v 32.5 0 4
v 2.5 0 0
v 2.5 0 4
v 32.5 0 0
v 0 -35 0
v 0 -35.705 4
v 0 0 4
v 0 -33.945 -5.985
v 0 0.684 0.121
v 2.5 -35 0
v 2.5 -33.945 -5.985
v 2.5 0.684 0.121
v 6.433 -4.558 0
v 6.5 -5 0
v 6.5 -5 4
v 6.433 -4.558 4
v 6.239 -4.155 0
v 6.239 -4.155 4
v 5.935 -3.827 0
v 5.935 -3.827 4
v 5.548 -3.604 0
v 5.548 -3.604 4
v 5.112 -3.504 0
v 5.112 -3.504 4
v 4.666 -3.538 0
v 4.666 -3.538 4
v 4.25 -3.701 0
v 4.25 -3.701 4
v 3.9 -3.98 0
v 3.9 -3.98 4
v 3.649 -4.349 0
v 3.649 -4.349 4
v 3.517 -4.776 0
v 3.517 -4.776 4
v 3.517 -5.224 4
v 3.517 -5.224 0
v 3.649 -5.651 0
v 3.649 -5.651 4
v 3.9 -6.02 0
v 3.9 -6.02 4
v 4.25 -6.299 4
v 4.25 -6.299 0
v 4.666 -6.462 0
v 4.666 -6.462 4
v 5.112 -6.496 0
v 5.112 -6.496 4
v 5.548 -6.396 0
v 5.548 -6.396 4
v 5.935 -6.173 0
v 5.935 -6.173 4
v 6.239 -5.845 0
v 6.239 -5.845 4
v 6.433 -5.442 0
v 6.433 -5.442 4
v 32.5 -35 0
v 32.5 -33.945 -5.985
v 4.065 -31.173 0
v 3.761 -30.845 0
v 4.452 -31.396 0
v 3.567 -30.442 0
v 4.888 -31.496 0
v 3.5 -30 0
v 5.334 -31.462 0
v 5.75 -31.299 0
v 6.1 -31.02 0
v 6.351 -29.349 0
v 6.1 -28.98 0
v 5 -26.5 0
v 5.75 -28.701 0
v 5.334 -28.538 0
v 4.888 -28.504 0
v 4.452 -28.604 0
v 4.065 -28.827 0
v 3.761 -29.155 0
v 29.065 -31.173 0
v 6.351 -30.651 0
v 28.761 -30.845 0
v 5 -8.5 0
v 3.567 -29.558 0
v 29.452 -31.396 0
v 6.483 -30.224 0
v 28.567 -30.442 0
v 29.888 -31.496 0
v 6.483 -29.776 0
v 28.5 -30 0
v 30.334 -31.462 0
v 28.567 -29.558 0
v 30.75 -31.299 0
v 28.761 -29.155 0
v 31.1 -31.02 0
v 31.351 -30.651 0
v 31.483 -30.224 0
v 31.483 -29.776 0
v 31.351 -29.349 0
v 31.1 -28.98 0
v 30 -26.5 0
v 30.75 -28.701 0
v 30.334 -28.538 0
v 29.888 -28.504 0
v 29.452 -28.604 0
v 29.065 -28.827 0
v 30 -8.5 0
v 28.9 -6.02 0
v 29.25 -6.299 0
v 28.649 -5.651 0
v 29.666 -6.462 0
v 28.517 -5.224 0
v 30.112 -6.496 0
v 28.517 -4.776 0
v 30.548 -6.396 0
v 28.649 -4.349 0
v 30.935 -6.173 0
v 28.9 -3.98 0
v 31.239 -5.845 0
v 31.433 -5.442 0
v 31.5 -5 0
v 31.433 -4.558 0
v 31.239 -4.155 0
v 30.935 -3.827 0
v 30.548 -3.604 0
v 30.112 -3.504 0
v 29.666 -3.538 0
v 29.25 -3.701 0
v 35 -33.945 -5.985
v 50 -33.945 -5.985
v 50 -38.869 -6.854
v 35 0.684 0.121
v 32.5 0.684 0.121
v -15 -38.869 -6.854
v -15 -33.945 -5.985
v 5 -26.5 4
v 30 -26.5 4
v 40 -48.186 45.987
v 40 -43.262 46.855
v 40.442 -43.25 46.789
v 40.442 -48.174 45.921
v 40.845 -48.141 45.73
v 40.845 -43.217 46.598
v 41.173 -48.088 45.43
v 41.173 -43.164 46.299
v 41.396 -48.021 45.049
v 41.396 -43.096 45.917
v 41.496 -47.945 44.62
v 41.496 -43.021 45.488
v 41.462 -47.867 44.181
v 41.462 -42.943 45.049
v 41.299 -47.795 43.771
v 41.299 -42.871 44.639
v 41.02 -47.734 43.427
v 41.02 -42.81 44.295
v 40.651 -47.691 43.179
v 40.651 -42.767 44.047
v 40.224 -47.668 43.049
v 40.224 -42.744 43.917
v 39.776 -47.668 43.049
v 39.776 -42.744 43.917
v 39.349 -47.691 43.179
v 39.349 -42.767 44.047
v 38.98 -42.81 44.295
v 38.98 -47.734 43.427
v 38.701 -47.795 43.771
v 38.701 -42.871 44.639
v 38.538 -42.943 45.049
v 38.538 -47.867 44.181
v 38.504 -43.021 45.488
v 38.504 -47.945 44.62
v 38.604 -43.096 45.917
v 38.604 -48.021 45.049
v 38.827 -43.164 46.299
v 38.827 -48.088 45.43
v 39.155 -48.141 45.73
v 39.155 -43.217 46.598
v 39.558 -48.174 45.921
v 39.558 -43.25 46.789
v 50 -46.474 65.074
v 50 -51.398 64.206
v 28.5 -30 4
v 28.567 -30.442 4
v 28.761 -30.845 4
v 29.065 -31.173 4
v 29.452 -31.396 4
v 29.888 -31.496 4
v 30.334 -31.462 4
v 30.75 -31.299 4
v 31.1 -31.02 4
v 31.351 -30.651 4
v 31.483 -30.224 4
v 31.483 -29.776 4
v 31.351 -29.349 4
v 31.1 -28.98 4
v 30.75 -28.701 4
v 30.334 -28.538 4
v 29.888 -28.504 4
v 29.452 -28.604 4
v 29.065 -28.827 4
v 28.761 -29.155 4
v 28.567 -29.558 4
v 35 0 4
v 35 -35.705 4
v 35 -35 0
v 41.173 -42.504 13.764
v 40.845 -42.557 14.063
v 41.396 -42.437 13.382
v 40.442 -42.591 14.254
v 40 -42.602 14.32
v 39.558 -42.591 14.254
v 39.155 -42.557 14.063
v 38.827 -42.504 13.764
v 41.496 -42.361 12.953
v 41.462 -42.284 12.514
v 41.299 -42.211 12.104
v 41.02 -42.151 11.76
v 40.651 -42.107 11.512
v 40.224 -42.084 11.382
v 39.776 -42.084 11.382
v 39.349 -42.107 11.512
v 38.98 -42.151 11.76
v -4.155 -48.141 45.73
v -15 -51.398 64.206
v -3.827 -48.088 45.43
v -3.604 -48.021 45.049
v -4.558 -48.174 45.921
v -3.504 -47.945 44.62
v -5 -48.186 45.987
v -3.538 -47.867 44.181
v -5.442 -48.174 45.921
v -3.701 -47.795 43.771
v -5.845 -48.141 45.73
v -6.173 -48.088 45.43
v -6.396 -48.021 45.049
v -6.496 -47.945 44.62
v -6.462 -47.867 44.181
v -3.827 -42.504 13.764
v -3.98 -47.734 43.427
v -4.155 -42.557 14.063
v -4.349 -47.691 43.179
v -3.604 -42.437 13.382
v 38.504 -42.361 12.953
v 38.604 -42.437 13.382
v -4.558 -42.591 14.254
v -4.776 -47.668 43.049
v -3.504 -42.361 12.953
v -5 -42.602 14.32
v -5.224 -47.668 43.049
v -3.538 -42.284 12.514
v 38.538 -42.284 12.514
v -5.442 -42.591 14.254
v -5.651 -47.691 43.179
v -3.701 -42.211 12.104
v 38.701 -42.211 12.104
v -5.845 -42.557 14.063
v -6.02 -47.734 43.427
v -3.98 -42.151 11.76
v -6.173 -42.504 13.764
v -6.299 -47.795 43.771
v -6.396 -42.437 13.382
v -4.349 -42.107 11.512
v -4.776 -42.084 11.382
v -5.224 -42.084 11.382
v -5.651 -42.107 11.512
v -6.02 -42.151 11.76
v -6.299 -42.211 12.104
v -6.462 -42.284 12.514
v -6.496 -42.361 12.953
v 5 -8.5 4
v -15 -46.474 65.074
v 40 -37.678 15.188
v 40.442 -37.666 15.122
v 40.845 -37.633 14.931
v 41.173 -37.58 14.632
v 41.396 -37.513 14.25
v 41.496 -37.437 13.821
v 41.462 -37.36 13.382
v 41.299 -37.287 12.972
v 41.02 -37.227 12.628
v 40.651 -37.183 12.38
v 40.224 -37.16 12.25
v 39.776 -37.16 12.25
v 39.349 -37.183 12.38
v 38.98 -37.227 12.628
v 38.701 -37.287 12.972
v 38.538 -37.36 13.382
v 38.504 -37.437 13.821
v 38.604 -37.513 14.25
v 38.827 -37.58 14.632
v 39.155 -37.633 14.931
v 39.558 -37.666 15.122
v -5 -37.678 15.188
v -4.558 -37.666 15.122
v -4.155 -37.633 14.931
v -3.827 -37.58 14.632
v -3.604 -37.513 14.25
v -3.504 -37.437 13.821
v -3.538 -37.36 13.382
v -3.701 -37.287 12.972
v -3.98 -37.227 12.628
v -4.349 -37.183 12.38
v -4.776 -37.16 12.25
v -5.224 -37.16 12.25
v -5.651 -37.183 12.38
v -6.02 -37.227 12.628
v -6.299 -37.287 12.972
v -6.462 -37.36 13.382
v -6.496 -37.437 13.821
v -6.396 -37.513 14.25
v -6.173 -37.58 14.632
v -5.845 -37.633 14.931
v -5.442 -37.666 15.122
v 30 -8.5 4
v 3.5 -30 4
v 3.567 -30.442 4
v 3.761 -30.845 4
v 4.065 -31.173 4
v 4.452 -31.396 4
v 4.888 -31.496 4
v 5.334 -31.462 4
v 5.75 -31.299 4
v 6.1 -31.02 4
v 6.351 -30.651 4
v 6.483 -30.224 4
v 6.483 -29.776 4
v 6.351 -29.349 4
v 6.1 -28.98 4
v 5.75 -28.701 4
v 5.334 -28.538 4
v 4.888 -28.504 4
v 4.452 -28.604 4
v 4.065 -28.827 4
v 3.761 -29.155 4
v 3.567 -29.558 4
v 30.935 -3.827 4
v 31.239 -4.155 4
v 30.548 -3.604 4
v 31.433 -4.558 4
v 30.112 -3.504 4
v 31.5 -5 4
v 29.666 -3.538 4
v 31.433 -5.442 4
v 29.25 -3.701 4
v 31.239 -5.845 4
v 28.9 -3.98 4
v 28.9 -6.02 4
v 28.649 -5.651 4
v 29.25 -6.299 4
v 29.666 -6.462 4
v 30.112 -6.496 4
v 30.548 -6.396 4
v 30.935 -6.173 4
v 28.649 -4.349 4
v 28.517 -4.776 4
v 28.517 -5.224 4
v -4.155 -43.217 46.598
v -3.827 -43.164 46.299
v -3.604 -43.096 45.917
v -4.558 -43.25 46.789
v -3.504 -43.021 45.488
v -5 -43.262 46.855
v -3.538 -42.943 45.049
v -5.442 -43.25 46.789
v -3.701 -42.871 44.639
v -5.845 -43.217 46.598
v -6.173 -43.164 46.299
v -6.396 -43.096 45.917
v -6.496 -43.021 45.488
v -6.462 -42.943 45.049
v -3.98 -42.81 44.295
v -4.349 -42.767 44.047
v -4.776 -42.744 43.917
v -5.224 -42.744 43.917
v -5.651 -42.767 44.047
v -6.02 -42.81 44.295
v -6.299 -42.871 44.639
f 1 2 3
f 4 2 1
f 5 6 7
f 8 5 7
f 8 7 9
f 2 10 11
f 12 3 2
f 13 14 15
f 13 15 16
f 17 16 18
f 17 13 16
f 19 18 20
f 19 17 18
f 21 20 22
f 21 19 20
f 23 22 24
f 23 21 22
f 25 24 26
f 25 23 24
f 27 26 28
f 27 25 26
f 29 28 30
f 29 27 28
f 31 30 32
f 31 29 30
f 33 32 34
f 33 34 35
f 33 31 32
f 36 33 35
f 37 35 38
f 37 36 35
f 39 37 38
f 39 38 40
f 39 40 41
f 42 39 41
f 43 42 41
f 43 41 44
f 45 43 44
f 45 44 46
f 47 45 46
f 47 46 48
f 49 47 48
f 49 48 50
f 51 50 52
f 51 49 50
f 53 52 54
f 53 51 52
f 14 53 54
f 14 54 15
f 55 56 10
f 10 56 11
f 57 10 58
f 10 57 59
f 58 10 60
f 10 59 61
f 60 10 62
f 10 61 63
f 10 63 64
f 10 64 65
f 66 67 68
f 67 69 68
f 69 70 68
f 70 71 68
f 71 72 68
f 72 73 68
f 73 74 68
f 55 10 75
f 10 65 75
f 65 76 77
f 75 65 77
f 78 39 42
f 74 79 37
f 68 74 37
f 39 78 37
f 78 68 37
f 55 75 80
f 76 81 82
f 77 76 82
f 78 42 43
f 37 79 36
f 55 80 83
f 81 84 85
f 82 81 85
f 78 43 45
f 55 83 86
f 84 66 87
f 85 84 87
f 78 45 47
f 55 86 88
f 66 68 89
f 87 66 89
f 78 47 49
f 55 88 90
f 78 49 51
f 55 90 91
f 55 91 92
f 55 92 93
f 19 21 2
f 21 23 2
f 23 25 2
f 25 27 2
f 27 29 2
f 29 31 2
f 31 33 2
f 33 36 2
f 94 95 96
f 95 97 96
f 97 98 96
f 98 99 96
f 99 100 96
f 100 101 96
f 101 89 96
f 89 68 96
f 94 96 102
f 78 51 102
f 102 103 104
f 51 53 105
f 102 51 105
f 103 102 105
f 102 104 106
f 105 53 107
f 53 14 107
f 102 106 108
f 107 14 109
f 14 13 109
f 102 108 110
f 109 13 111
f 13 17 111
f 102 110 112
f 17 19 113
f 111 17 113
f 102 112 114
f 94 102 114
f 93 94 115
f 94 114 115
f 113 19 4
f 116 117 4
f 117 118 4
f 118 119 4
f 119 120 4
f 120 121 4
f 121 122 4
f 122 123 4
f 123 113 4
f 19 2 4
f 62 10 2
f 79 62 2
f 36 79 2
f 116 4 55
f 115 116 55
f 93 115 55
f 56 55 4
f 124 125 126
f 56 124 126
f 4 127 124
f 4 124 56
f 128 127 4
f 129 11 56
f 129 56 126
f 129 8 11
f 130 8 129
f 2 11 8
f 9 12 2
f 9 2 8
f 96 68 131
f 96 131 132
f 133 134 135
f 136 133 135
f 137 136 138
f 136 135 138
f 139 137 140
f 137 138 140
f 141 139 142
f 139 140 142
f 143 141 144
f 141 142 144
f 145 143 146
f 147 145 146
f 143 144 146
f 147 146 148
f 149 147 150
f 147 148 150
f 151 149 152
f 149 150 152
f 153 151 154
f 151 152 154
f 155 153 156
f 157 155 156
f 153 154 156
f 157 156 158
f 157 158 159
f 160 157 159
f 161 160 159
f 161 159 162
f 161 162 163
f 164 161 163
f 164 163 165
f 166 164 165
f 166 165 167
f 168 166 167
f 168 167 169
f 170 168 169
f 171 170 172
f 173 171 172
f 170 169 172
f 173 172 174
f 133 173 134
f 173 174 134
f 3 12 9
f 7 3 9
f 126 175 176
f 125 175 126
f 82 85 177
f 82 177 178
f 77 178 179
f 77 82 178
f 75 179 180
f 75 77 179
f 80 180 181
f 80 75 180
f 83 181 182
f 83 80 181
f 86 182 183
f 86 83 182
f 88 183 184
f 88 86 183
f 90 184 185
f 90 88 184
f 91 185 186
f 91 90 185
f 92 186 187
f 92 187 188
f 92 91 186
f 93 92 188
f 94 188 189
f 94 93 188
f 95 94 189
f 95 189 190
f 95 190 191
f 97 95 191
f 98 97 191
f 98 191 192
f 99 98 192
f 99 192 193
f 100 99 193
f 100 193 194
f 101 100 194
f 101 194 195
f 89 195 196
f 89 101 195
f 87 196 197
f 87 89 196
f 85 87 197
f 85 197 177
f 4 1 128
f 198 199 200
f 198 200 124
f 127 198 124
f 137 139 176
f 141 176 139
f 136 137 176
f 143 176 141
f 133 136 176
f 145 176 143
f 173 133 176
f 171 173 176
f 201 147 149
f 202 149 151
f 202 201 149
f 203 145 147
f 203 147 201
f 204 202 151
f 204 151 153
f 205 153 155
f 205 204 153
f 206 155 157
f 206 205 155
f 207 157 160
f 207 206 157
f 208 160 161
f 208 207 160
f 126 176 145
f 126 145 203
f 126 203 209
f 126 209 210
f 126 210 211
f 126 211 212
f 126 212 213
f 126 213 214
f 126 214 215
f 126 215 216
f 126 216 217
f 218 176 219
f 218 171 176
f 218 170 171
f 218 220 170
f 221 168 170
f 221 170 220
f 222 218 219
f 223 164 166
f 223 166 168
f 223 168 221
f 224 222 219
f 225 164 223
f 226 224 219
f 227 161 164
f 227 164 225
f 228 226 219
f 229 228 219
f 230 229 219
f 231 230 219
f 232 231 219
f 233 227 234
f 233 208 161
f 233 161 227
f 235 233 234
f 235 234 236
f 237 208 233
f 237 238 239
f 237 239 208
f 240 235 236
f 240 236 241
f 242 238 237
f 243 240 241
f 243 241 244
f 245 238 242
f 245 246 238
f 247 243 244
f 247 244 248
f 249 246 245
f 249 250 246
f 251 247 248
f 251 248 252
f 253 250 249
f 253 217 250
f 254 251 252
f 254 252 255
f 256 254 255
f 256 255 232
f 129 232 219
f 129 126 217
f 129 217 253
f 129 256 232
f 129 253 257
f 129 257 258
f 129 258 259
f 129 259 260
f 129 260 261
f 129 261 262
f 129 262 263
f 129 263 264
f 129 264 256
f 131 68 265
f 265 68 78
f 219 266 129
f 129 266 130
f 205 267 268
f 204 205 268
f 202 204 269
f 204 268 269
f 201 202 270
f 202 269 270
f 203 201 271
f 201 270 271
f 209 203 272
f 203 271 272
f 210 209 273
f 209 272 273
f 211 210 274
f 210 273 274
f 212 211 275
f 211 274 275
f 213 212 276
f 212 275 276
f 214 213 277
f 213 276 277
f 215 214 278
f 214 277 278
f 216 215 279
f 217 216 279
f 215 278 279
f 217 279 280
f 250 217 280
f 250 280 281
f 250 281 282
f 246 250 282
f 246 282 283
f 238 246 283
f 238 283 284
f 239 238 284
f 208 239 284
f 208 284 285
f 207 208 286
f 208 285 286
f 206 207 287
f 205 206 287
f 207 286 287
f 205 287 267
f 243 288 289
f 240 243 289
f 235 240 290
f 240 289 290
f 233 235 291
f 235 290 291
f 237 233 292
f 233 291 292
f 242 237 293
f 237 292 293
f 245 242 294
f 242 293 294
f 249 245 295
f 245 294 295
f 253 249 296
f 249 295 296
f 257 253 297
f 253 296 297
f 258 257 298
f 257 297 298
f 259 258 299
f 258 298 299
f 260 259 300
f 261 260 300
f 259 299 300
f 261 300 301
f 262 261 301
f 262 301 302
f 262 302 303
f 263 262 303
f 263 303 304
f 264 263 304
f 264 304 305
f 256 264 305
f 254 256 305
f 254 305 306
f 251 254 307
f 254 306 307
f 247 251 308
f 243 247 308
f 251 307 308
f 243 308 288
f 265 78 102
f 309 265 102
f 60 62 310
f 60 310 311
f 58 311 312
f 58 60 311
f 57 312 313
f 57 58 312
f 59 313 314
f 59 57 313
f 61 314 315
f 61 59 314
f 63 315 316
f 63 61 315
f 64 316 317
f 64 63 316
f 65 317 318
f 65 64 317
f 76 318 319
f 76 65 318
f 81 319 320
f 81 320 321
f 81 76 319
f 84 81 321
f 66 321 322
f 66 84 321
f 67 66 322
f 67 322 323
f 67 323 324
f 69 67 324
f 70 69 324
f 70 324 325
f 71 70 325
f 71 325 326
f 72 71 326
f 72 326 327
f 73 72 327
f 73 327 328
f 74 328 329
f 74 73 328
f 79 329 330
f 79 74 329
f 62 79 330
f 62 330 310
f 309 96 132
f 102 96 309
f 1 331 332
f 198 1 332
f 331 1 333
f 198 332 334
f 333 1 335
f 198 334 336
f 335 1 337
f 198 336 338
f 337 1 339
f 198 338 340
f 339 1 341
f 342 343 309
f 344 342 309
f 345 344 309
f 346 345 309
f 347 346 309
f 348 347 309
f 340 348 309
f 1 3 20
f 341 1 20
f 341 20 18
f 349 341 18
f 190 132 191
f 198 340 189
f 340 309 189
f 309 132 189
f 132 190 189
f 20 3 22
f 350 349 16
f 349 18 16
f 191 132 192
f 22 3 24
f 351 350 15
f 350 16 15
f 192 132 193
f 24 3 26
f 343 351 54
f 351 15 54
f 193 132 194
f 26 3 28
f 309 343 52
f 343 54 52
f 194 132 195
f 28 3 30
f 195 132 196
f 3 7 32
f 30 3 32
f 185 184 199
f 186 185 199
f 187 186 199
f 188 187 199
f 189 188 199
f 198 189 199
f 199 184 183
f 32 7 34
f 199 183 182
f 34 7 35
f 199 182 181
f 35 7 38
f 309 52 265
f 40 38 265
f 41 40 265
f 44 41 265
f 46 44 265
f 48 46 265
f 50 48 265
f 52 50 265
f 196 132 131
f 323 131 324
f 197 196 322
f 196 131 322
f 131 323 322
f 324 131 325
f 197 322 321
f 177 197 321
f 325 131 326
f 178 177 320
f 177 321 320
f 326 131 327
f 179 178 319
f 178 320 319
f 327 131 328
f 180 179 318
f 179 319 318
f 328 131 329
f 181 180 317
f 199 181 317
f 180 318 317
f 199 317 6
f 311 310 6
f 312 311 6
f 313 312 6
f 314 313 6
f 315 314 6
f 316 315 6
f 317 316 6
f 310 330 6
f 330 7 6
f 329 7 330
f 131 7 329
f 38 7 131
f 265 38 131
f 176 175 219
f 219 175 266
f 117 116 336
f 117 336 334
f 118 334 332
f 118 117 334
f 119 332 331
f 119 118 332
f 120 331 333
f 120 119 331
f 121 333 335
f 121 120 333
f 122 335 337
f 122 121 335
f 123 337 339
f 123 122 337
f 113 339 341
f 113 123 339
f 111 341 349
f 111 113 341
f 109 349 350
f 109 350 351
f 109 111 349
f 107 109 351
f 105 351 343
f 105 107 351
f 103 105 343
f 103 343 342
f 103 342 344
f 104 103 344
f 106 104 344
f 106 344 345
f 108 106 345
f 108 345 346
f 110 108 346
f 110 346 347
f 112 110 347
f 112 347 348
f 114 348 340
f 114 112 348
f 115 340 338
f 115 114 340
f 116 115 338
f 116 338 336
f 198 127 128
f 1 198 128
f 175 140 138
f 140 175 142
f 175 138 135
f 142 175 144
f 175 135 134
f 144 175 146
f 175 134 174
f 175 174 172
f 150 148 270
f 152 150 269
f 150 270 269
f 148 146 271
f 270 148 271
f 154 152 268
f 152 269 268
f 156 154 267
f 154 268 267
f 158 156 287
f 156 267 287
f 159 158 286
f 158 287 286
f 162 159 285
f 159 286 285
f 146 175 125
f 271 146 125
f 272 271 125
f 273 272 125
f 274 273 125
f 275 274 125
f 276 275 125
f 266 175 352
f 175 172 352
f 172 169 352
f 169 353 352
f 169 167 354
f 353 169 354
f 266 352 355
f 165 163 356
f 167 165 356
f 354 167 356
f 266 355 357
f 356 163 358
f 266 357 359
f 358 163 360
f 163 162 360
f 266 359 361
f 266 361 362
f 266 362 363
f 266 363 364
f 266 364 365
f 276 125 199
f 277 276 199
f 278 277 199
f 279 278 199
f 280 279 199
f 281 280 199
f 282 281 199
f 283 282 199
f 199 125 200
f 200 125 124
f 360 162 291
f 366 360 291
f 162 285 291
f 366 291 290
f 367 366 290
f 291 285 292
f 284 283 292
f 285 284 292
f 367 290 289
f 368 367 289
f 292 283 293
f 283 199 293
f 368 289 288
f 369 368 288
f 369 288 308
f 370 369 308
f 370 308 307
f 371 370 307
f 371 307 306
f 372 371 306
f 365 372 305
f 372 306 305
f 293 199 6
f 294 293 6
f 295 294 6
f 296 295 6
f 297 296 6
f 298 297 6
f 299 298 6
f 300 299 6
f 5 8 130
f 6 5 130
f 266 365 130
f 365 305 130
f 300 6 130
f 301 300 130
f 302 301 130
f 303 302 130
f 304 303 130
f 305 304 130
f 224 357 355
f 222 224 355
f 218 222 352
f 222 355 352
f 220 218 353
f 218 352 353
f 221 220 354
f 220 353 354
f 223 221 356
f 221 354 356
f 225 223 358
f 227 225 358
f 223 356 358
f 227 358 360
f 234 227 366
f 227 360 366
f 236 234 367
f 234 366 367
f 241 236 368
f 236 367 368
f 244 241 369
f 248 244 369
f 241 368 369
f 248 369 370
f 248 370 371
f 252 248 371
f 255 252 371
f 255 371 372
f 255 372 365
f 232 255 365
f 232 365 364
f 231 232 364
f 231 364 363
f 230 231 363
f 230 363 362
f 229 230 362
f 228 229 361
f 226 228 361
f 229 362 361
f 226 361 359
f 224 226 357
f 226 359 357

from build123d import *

# Parameters (mm, degrees)
SKETCH_1_W          = 35
SKETCH_1_H          = 35
SKETCH_1_R          = 1.5
SKETCH_1_W_2        = 25
SKETCH_1_H_2        = 18
EXTRUDE_1_DEPTH     = 4
EXTRUDE_START       = -35.162864
SKETCH_3_W          = 2.5
SKETCH_3_H          = 6.077686218
EXTRUDE_2_DEPTH     = 35.162864
CUT_EXTRUDE_1_DEPTH = 35
SKETCH_5_W          = 65
SKETCH_5_H          = 72.155372437
EXTRUDE_3_DEPTH     = 5
EXTRUDE_4_DEPTH     = 35
SKETCH_7_R          = 1.5
CUT_EXTRUDE_2_DEPTH = 5


with BuildPart() as part:
    # 草图1 → 凸台-拉伸1 (new body)
    with BuildSketch(Plane.XY):
        with Locations((17.5, -17.5)):
            Rectangle(SKETCH_1_W, SKETCH_1_H)
        with Locations((5, -5)):
            Circle(SKETCH_1_R, mode=Mode.SUBTRACT)
        with Locations(Location((30, -30, 0), (0, 0, 180))):
            Circle(SKETCH_1_R, mode=Mode.SUBTRACT)
        with Locations((30, -5)):
            Circle(SKETCH_1_R, mode=Mode.SUBTRACT)
        with Locations(Location((5, -30, 0), (0, 0, 180))):
            Circle(SKETCH_1_R, mode=Mode.SUBTRACT)
        with Locations((17.5, -17.5)):
            Rectangle(SKETCH_1_W_2, SKETCH_1_H_2, mode=Mode.SUBTRACT)
    extrude(amount=EXTRUDE_1_DEPTH)

    # 草图3 → 凸台-拉伸2 (add)
    with BuildSketch(Plane(origin=(0, -33.944620864, -5.985352508), x_dir=(-1, 0, 0), z_dir=(0, -0.9848077530122076, -0.17364817766693394)).offset(EXTRUDE_START)):
        with Locations((-33.75, -3.038843109)):
            Rectangle(SKETCH_3_W, SKETCH_3_H)
        with Locations((-1.25, -3.038843109)):
            Rectangle(SKETCH_3_W, SKETCH_3_H)
    extrude(amount=EXTRUDE_2_DEPTH)

    # 草图4 → 切除-拉伸1 (cut)
    with BuildSketch(Plane(origin=(35, 0, 0), x_dir=(0, 0, -1), z_dir=(1, 0, 0))):
        Polygon((-4, 0), (-6.105967267, -0.37133885), (-4, -12.314872722), align=None)
    extrude(amount=-CUT_EXTRUDE_1_DEPTH, mode=Mode.SUBTRACT)



with BuildPart() as body_2:
    # 草图5 → 凸台-拉伸3 (new body)
    with BuildSketch(Plane(origin=(0, -33.944620864, -5.985352508), x_dir=(-1, 0, 0), z_dir=(0, -0.9848077530122076, -0.17364817766693394))):
        with Locations((-17.5, -36.077686219)):
            Rectangle(SKETCH_5_W, SKETCH_5_H)
    extrude(amount=EXTRUDE_3_DEPTH)


with BuildPart() as part_1:
    add(part.part)

    add(body_2.part)  # 凸台-拉伸4 merges body 2
    # 草图6 → 凸台-拉伸4 (add)
    with BuildSketch(Plane.ZY):
        Polygon((4, -35), (4, -35.705307923), (0, -35), align=None)
    extrude(amount=-EXTRUDE_4_DEPTH)

    # 草图7 → 切除-拉伸2 (cut)
    with BuildSketch(Plane(origin=(0, -33.944620864, -5.985352508), x_dir=(1, 0, 0), z_dir=(0, 0.9848077530122076, 0.17364817766693394))):
        with Locations(Location((-5, -20, 0), (0, 0, 270))):
            Circle(SKETCH_7_R)
        with Locations(Location((-5, -52.155372437, 0), (0, 0, 270))):
            Circle(SKETCH_7_R)
        with Locations(Location((40, -52.155372437, 0), (0, 0, 270))):
            Circle(SKETCH_7_R)
        with Locations(Location((40, -20, 0), (0, 0, 270))):
            Circle(SKETCH_7_R)
    extrude(amount=-CUT_EXTRUDE_2_DEPTH, mode=Mode.SUBTRACT)


solid = part_1.part
